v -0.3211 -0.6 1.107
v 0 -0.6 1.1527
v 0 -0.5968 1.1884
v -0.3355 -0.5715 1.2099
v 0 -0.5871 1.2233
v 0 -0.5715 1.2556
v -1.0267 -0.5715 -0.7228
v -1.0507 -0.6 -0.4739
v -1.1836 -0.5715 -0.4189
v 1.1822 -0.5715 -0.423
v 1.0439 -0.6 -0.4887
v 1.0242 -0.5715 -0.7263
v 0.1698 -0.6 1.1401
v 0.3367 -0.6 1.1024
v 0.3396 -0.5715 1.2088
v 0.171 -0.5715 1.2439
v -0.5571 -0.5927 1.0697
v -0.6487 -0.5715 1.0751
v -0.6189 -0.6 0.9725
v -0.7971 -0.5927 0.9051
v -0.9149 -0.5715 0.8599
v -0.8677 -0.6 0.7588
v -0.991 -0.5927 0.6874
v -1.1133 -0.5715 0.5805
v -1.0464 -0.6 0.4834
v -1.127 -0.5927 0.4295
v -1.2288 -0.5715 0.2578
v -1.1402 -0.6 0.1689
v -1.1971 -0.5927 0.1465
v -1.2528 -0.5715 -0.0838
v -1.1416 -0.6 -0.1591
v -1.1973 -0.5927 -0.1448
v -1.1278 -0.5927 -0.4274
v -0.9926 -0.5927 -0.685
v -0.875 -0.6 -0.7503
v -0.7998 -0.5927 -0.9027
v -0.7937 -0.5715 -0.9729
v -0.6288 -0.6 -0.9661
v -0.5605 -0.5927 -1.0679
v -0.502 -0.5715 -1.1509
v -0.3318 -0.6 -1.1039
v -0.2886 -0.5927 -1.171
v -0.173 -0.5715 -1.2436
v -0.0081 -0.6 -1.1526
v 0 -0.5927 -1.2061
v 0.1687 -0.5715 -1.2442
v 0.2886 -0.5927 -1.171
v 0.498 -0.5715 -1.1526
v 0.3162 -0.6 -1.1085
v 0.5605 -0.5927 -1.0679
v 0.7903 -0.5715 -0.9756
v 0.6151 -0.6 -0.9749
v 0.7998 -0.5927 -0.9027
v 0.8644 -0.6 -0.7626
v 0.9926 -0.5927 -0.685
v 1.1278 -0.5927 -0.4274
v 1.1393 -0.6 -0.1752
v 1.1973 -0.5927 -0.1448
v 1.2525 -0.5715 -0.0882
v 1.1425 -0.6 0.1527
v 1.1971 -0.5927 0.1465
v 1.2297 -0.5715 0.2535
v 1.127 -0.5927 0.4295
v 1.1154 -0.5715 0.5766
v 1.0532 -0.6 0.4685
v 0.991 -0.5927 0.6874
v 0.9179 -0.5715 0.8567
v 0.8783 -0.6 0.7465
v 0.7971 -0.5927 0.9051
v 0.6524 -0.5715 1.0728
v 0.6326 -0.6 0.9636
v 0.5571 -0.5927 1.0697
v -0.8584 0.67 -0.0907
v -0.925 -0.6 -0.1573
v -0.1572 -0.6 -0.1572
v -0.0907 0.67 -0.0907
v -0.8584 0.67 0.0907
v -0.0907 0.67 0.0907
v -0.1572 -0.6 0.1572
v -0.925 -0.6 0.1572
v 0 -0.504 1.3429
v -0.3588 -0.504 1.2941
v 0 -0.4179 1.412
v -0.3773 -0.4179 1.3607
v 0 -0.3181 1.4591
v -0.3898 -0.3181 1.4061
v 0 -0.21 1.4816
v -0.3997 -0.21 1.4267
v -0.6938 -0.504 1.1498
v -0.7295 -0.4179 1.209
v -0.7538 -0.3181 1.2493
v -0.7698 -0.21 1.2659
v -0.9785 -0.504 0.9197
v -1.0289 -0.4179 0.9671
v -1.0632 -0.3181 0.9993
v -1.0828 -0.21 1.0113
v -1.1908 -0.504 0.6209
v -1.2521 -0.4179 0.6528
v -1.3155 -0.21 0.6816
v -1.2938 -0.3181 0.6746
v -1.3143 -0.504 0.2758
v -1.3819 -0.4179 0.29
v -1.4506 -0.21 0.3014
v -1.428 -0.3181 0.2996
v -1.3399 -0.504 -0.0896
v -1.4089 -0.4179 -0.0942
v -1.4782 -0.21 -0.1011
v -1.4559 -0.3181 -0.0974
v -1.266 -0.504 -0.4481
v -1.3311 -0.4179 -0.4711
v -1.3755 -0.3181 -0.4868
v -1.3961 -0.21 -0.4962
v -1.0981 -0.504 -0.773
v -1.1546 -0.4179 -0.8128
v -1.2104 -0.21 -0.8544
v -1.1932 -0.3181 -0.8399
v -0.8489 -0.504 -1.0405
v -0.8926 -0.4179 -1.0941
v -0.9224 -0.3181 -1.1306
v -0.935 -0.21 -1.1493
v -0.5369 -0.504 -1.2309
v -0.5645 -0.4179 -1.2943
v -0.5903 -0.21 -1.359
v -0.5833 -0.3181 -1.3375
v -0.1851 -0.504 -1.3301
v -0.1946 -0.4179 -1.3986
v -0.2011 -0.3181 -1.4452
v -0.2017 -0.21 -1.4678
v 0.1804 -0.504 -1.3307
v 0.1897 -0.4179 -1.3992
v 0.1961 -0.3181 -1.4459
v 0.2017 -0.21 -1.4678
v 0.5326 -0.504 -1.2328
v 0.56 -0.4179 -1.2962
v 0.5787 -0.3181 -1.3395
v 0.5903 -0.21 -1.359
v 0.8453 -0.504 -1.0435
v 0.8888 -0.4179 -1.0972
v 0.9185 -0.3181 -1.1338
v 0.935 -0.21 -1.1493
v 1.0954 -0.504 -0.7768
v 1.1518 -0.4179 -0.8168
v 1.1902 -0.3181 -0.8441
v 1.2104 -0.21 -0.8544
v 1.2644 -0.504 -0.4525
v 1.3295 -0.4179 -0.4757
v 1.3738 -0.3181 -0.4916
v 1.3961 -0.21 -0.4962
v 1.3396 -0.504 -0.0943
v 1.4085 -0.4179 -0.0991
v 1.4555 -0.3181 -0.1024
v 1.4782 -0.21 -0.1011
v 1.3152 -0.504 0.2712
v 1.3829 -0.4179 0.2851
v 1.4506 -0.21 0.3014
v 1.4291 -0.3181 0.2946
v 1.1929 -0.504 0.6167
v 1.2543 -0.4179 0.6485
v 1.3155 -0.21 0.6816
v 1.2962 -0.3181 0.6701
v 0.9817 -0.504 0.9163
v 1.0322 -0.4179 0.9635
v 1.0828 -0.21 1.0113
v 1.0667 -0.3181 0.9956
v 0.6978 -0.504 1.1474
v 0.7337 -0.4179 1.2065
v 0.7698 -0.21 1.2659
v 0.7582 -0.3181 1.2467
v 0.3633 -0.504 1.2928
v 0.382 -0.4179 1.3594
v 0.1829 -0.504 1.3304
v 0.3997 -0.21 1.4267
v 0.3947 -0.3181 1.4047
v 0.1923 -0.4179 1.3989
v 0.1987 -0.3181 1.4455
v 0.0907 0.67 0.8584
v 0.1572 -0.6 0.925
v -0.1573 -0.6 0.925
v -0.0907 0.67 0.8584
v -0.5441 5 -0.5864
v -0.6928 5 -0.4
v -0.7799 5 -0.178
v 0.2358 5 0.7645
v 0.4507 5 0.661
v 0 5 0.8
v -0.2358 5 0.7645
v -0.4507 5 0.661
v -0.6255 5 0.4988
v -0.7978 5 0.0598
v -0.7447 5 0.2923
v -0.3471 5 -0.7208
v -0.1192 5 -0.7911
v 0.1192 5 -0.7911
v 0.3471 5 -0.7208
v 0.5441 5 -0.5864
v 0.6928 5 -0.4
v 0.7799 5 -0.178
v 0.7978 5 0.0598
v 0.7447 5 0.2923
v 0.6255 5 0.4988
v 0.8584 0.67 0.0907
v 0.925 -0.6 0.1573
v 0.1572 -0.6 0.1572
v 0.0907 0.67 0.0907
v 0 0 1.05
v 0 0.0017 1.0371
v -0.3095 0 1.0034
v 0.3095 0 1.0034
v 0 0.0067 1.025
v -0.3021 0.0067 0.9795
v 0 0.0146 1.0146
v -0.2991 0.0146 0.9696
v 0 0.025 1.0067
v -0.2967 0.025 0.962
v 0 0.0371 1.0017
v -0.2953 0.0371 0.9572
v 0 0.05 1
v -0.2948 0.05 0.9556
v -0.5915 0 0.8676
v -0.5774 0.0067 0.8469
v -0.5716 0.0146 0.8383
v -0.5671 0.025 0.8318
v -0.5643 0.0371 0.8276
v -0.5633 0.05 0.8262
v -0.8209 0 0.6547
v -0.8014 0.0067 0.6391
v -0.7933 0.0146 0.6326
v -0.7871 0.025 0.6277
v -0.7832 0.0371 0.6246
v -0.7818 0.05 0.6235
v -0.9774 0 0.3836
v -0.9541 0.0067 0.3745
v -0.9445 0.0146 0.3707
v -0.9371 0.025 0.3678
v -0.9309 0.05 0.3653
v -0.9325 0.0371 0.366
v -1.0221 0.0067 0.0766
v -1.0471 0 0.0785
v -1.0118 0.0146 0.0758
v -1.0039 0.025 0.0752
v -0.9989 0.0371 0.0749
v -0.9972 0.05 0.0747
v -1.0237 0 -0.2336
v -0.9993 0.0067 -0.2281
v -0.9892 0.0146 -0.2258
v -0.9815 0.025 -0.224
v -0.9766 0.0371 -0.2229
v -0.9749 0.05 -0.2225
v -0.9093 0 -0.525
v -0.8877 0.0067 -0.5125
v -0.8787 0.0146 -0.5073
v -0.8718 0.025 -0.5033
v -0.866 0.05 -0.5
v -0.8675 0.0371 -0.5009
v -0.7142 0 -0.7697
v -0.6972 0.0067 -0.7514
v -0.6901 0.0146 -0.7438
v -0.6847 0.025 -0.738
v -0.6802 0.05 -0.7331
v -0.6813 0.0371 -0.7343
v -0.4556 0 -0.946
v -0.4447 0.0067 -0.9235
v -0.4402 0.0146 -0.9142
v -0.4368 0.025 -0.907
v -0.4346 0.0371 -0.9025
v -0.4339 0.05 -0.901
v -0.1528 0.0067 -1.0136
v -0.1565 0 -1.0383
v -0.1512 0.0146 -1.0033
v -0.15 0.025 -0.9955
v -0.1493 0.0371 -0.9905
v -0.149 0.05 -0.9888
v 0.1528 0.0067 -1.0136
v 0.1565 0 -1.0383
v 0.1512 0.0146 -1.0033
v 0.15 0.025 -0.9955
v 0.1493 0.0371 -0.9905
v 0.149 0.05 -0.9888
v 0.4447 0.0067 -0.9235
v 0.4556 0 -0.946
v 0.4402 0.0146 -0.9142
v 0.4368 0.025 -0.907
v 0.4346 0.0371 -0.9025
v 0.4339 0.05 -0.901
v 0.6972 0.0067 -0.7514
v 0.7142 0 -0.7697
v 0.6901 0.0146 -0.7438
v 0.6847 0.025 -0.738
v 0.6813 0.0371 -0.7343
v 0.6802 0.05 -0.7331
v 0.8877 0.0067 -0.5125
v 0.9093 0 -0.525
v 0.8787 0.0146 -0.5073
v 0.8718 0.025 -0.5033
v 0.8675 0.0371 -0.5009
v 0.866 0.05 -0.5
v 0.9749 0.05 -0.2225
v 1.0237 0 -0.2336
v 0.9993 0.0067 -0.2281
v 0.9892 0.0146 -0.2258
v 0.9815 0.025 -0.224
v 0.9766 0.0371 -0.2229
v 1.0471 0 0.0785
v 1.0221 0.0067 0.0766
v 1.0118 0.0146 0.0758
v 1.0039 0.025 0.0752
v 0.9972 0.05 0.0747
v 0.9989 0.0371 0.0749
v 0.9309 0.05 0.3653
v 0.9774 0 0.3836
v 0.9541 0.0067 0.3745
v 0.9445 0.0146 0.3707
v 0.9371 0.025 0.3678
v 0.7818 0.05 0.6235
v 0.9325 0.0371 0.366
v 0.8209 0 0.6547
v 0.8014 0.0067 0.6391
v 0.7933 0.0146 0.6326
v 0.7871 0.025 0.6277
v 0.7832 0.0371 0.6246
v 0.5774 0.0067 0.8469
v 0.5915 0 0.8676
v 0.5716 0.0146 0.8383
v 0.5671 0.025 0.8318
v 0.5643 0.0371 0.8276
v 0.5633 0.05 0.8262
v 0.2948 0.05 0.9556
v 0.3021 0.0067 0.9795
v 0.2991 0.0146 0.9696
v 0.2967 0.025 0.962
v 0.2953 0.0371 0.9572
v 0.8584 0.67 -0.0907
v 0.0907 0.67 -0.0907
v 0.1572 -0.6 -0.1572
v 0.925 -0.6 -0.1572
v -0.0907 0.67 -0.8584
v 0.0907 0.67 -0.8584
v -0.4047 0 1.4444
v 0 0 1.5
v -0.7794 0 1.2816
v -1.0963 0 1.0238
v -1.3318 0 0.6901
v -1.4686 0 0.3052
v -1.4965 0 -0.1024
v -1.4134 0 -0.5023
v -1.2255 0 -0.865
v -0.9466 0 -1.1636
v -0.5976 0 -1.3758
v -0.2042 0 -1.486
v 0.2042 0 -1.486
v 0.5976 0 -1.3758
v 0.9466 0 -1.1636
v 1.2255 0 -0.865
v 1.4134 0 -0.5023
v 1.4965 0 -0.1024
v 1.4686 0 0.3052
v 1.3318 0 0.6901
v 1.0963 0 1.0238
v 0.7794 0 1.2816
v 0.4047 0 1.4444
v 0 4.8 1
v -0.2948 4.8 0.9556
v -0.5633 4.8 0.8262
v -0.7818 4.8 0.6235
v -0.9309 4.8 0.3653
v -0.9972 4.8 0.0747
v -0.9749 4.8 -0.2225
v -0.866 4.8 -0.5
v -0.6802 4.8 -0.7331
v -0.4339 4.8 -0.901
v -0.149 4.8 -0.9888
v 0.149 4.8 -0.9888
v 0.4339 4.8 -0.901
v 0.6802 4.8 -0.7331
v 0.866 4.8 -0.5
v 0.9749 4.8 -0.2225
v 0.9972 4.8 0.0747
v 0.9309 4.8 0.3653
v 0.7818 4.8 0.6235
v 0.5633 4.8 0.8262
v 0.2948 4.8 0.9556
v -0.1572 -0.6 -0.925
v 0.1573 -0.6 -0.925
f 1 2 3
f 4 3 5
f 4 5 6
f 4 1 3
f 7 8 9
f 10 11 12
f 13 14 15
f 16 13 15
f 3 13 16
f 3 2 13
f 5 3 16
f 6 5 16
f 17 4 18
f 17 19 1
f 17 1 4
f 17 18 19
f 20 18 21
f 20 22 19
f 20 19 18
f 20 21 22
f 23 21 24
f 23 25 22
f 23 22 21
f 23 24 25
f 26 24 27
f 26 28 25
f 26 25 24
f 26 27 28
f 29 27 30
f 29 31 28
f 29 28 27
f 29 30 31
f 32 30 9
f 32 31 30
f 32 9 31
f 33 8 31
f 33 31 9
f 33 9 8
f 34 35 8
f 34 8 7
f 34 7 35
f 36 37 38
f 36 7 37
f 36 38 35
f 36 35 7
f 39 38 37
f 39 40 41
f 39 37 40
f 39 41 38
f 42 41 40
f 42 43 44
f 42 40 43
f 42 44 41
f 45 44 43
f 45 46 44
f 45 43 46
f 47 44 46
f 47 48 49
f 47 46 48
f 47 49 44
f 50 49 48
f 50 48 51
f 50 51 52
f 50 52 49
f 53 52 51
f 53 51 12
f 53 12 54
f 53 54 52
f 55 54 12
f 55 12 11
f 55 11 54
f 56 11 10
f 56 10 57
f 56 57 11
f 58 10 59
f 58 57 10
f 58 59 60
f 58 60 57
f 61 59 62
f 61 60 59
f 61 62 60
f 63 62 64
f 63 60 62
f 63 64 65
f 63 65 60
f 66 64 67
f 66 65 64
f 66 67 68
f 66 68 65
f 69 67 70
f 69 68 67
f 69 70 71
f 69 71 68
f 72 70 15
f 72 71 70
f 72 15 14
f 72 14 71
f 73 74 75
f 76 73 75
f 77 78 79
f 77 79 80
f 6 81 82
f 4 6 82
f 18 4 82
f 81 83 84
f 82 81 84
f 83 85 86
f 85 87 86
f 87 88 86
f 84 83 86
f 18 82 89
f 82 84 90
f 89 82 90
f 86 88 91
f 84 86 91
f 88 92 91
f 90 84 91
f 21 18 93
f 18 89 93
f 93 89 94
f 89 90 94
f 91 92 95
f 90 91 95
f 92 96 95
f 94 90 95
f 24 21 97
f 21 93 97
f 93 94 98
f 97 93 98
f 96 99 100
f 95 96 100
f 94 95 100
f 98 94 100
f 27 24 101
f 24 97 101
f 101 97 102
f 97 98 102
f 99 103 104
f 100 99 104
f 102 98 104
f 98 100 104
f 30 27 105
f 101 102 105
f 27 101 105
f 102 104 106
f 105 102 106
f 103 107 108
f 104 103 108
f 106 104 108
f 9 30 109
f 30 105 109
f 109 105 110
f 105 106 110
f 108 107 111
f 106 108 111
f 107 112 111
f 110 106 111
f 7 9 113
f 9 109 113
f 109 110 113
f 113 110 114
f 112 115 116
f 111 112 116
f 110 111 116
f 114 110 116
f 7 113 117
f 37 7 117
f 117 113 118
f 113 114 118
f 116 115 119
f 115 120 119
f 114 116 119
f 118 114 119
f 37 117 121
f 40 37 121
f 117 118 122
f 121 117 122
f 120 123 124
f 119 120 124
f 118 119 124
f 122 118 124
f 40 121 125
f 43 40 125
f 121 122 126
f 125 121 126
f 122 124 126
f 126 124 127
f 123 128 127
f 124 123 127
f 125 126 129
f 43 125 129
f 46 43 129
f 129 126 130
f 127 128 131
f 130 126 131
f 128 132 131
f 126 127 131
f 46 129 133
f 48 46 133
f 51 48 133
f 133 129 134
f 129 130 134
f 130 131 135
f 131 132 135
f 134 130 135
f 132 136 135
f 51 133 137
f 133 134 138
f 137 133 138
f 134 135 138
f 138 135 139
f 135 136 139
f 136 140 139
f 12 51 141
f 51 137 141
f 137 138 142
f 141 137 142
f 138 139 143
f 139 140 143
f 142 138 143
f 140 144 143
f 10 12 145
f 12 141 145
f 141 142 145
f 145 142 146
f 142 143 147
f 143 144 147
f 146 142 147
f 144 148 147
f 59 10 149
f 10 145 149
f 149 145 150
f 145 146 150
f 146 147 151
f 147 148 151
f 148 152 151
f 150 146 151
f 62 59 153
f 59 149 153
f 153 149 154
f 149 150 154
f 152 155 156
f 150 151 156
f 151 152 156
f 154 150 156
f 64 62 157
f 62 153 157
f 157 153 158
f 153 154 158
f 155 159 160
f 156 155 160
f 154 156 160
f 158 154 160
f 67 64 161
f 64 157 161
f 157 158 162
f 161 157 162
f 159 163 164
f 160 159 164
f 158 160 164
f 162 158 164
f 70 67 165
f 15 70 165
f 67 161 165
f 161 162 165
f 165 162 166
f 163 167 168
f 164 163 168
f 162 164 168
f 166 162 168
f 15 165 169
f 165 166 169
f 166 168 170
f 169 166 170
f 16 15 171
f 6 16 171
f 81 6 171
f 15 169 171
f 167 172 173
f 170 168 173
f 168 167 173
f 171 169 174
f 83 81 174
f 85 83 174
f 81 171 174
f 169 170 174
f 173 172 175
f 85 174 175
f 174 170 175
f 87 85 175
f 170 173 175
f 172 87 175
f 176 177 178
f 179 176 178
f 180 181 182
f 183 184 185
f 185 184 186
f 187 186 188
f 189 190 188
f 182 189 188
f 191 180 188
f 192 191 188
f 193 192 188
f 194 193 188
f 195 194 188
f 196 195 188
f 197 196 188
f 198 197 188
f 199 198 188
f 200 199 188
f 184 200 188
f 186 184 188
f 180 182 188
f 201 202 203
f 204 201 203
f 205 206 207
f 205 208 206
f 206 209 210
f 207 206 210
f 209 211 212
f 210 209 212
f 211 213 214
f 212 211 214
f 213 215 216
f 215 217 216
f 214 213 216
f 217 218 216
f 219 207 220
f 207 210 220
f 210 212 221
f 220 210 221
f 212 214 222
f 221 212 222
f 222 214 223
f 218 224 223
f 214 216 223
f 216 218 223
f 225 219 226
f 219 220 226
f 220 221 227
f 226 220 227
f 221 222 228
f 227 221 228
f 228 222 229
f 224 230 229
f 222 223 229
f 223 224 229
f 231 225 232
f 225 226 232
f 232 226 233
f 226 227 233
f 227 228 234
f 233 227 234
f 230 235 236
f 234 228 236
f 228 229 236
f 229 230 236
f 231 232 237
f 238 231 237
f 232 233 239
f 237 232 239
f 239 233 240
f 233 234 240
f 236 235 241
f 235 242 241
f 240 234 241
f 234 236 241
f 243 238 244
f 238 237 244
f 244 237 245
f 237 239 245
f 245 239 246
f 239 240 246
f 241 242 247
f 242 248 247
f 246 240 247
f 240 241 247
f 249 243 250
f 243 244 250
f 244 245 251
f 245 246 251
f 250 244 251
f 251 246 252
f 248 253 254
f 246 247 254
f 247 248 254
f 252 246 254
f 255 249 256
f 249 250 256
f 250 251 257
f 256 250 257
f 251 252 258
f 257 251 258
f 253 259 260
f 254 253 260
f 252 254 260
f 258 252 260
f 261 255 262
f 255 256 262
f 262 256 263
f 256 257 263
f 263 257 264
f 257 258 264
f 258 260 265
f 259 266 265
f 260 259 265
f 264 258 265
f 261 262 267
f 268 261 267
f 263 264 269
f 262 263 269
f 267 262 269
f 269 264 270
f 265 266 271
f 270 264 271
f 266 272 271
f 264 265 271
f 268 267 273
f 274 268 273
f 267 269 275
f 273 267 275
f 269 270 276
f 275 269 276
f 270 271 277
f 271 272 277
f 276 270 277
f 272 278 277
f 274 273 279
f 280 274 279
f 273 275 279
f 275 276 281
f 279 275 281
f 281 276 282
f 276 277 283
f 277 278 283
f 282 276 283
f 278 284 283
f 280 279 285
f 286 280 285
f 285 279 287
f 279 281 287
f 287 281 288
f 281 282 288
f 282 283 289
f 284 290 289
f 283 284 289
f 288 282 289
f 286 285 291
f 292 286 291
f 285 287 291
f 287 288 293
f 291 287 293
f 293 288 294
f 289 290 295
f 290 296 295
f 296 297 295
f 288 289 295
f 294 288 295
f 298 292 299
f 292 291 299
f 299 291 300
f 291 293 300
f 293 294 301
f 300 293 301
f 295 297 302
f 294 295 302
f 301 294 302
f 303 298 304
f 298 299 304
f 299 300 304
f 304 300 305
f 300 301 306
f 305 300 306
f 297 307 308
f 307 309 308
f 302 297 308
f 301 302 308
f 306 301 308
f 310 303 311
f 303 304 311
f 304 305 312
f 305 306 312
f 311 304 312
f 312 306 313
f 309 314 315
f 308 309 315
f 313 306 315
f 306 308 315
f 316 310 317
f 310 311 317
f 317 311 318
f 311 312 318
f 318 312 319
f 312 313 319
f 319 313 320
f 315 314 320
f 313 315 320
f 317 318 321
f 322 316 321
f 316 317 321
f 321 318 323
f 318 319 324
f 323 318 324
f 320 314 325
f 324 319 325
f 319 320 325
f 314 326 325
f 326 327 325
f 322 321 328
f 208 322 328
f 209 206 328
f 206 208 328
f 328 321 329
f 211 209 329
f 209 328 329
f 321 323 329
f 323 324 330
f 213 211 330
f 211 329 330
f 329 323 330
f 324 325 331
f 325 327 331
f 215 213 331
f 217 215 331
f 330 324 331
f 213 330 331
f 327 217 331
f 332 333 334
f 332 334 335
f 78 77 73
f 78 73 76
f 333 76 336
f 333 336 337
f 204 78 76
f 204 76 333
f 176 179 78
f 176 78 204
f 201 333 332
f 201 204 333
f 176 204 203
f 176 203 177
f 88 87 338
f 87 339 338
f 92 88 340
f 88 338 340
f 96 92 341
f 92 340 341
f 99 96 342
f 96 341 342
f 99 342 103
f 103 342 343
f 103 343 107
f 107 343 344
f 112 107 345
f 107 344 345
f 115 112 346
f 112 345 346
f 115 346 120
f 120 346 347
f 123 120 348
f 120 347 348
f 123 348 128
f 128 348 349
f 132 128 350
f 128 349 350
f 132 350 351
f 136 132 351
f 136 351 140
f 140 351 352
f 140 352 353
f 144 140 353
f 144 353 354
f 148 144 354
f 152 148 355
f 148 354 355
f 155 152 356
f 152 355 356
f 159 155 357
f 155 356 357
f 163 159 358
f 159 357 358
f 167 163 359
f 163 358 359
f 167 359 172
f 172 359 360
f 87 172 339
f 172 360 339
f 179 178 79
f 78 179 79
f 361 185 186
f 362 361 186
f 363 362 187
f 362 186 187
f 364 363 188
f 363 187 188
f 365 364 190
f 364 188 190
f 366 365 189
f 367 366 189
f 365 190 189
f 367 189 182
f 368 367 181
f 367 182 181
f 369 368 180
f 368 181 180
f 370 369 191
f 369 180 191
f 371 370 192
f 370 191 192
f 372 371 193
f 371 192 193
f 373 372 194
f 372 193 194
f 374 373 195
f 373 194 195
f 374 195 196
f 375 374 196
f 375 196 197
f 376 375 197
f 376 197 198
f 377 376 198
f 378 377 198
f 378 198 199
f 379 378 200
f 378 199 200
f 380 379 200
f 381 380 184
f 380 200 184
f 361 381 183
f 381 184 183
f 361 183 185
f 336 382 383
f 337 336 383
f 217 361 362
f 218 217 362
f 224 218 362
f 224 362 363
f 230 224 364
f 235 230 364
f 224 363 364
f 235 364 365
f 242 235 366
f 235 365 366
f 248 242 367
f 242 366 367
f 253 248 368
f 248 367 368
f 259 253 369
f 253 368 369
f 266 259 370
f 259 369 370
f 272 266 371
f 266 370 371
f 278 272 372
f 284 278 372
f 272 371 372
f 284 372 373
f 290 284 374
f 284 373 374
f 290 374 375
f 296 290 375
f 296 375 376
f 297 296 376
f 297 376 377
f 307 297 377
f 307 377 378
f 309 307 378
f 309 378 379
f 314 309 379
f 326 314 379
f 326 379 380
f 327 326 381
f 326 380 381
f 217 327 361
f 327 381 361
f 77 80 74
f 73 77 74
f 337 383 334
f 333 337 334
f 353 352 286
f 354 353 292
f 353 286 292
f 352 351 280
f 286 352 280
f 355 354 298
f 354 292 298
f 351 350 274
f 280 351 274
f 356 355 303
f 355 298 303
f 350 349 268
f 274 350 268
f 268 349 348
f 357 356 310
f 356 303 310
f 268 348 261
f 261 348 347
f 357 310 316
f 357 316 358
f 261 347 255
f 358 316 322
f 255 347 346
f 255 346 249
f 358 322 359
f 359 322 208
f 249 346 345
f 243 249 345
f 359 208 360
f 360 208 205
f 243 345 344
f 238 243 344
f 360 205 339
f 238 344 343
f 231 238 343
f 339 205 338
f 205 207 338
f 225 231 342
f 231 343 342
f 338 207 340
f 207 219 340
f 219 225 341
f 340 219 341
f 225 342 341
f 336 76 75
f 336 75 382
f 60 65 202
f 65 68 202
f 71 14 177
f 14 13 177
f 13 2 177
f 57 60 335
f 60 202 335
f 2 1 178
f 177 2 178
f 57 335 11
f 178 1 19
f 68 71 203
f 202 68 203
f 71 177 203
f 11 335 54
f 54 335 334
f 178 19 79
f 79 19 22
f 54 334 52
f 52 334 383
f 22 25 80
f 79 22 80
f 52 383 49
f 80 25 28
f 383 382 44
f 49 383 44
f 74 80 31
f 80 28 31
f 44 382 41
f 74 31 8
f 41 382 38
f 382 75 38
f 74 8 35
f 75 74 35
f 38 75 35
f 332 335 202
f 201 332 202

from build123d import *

# Parameters (mm, degrees)
FILLET5_R          = 0.2
CUT_EXTRUDE1_DEPTH = 1.27
CUT_EXTRUDE1_DRAFT = -3
FILLET4_R          = 0.05
CHAMFER1_SIZE      = 0.2


with BuildPart() as part:
    # Sketch1 → Revolve1 (revolve)
    with BuildSketch(Plane(origin=(0, 0, 0), x_dir=(0, 0, -1), z_dir=(1, 0, 0))):
        with BuildLine():
            Line((-1, 0), (-1, 5))
            Line((-1, 5), (0, 5))
            Line((0, 5), (0, -0.6))
            Line((0, -0.6), (-1.2, -0.6))
            ThreePointArc((-1.2, -0.6), (-1.394587635, -0.443831321), (-1.481627381, -0.21))
            Line((-1.481627381, -0.21), (-1.5, 0))
            Line((-1.5, 0), (-1, 0))
        make_face()
    revolve(axis=Axis((0, 5, 0), (0, -1, 0)))

    # Fillet5
    fillet5_edges = [part.edges().sort_by_distance(p)[0] for p in [
        (0, -0.6, -1.2),
    ]]
    fillet(fillet5_edges, radius=FILLET5_R)


with BuildPart() as cut_extrude1_tool:
    # Sketch2 → Cut-Extrude1 (with draft: the straight prism first)
    with BuildSketch(Plane.XZ.offset(0.6)):
        Polygon((0.15725, 0.15725), (0.15725, 0.925), (-0.15725, 0.925), (-0.15725, 0.15725), (-0.925, 0.15725), (-0.925, -0.15725), (-0.15725, -0.15725), (-0.15725, -0.925), (0.15725, -0.925), (0.15725, -0.15725), (0.925, -0.15725), (0.925, 0.15725), align=None)
    extrude(amount=-CUT_EXTRUDE1_DEPTH)
    # Cut-Extrude1: the draft: its side faces are tilted about the plane it starts from
    cut_extrude1_sides = [cut_extrude1_tool.faces().sort_by_distance(p)[0] for p in [
        (0.15725, 0.035, 0.541125),
        (0, 0.035, 0.925),
        (-0.15725, 0.035, 0.541125),
        (-0.541125, 0.035, 0.15725),
        (-0.925, 0.035, 0),
        (-0.541125, 0.035, -0.15725),
        (-0.15725, 0.035, -0.541125),
        (0, 0.035, -0.925),
        (0.15725, 0.035, -0.541125),
        (0.541125, 0.035, -0.15725),
        (0.925, 0.035, 0),
        (0.541125, 0.035, 0.15725),
    ]]
    draft(cut_extrude1_sides, Plane.XZ.offset(0.6), CUT_EXTRUDE1_DRAFT)


with BuildPart() as part_1:
    add(part.part)

    # Cut-Extrude1: cut by cut_extrude1_tool
    add(cut_extrude1_tool.part, mode=Mode.SUBTRACT)

    # Fillet4
    fillet4_edges = [part_1.edges().sort_by_distance(p)[0] for p in [
        (0, 0, -1),
    ]]
    fillet(fillet4_edges, radius=FILLET4_R)

    # Chamfer1
    chamfer1_edges = [part_1.edges().sort_by_distance(p)[0] for p in [
        (0, 5, -1),
    ]]
    chamfer(chamfer1_edges, length=CHAMFER1_SIZE)


solid = part_1.part
